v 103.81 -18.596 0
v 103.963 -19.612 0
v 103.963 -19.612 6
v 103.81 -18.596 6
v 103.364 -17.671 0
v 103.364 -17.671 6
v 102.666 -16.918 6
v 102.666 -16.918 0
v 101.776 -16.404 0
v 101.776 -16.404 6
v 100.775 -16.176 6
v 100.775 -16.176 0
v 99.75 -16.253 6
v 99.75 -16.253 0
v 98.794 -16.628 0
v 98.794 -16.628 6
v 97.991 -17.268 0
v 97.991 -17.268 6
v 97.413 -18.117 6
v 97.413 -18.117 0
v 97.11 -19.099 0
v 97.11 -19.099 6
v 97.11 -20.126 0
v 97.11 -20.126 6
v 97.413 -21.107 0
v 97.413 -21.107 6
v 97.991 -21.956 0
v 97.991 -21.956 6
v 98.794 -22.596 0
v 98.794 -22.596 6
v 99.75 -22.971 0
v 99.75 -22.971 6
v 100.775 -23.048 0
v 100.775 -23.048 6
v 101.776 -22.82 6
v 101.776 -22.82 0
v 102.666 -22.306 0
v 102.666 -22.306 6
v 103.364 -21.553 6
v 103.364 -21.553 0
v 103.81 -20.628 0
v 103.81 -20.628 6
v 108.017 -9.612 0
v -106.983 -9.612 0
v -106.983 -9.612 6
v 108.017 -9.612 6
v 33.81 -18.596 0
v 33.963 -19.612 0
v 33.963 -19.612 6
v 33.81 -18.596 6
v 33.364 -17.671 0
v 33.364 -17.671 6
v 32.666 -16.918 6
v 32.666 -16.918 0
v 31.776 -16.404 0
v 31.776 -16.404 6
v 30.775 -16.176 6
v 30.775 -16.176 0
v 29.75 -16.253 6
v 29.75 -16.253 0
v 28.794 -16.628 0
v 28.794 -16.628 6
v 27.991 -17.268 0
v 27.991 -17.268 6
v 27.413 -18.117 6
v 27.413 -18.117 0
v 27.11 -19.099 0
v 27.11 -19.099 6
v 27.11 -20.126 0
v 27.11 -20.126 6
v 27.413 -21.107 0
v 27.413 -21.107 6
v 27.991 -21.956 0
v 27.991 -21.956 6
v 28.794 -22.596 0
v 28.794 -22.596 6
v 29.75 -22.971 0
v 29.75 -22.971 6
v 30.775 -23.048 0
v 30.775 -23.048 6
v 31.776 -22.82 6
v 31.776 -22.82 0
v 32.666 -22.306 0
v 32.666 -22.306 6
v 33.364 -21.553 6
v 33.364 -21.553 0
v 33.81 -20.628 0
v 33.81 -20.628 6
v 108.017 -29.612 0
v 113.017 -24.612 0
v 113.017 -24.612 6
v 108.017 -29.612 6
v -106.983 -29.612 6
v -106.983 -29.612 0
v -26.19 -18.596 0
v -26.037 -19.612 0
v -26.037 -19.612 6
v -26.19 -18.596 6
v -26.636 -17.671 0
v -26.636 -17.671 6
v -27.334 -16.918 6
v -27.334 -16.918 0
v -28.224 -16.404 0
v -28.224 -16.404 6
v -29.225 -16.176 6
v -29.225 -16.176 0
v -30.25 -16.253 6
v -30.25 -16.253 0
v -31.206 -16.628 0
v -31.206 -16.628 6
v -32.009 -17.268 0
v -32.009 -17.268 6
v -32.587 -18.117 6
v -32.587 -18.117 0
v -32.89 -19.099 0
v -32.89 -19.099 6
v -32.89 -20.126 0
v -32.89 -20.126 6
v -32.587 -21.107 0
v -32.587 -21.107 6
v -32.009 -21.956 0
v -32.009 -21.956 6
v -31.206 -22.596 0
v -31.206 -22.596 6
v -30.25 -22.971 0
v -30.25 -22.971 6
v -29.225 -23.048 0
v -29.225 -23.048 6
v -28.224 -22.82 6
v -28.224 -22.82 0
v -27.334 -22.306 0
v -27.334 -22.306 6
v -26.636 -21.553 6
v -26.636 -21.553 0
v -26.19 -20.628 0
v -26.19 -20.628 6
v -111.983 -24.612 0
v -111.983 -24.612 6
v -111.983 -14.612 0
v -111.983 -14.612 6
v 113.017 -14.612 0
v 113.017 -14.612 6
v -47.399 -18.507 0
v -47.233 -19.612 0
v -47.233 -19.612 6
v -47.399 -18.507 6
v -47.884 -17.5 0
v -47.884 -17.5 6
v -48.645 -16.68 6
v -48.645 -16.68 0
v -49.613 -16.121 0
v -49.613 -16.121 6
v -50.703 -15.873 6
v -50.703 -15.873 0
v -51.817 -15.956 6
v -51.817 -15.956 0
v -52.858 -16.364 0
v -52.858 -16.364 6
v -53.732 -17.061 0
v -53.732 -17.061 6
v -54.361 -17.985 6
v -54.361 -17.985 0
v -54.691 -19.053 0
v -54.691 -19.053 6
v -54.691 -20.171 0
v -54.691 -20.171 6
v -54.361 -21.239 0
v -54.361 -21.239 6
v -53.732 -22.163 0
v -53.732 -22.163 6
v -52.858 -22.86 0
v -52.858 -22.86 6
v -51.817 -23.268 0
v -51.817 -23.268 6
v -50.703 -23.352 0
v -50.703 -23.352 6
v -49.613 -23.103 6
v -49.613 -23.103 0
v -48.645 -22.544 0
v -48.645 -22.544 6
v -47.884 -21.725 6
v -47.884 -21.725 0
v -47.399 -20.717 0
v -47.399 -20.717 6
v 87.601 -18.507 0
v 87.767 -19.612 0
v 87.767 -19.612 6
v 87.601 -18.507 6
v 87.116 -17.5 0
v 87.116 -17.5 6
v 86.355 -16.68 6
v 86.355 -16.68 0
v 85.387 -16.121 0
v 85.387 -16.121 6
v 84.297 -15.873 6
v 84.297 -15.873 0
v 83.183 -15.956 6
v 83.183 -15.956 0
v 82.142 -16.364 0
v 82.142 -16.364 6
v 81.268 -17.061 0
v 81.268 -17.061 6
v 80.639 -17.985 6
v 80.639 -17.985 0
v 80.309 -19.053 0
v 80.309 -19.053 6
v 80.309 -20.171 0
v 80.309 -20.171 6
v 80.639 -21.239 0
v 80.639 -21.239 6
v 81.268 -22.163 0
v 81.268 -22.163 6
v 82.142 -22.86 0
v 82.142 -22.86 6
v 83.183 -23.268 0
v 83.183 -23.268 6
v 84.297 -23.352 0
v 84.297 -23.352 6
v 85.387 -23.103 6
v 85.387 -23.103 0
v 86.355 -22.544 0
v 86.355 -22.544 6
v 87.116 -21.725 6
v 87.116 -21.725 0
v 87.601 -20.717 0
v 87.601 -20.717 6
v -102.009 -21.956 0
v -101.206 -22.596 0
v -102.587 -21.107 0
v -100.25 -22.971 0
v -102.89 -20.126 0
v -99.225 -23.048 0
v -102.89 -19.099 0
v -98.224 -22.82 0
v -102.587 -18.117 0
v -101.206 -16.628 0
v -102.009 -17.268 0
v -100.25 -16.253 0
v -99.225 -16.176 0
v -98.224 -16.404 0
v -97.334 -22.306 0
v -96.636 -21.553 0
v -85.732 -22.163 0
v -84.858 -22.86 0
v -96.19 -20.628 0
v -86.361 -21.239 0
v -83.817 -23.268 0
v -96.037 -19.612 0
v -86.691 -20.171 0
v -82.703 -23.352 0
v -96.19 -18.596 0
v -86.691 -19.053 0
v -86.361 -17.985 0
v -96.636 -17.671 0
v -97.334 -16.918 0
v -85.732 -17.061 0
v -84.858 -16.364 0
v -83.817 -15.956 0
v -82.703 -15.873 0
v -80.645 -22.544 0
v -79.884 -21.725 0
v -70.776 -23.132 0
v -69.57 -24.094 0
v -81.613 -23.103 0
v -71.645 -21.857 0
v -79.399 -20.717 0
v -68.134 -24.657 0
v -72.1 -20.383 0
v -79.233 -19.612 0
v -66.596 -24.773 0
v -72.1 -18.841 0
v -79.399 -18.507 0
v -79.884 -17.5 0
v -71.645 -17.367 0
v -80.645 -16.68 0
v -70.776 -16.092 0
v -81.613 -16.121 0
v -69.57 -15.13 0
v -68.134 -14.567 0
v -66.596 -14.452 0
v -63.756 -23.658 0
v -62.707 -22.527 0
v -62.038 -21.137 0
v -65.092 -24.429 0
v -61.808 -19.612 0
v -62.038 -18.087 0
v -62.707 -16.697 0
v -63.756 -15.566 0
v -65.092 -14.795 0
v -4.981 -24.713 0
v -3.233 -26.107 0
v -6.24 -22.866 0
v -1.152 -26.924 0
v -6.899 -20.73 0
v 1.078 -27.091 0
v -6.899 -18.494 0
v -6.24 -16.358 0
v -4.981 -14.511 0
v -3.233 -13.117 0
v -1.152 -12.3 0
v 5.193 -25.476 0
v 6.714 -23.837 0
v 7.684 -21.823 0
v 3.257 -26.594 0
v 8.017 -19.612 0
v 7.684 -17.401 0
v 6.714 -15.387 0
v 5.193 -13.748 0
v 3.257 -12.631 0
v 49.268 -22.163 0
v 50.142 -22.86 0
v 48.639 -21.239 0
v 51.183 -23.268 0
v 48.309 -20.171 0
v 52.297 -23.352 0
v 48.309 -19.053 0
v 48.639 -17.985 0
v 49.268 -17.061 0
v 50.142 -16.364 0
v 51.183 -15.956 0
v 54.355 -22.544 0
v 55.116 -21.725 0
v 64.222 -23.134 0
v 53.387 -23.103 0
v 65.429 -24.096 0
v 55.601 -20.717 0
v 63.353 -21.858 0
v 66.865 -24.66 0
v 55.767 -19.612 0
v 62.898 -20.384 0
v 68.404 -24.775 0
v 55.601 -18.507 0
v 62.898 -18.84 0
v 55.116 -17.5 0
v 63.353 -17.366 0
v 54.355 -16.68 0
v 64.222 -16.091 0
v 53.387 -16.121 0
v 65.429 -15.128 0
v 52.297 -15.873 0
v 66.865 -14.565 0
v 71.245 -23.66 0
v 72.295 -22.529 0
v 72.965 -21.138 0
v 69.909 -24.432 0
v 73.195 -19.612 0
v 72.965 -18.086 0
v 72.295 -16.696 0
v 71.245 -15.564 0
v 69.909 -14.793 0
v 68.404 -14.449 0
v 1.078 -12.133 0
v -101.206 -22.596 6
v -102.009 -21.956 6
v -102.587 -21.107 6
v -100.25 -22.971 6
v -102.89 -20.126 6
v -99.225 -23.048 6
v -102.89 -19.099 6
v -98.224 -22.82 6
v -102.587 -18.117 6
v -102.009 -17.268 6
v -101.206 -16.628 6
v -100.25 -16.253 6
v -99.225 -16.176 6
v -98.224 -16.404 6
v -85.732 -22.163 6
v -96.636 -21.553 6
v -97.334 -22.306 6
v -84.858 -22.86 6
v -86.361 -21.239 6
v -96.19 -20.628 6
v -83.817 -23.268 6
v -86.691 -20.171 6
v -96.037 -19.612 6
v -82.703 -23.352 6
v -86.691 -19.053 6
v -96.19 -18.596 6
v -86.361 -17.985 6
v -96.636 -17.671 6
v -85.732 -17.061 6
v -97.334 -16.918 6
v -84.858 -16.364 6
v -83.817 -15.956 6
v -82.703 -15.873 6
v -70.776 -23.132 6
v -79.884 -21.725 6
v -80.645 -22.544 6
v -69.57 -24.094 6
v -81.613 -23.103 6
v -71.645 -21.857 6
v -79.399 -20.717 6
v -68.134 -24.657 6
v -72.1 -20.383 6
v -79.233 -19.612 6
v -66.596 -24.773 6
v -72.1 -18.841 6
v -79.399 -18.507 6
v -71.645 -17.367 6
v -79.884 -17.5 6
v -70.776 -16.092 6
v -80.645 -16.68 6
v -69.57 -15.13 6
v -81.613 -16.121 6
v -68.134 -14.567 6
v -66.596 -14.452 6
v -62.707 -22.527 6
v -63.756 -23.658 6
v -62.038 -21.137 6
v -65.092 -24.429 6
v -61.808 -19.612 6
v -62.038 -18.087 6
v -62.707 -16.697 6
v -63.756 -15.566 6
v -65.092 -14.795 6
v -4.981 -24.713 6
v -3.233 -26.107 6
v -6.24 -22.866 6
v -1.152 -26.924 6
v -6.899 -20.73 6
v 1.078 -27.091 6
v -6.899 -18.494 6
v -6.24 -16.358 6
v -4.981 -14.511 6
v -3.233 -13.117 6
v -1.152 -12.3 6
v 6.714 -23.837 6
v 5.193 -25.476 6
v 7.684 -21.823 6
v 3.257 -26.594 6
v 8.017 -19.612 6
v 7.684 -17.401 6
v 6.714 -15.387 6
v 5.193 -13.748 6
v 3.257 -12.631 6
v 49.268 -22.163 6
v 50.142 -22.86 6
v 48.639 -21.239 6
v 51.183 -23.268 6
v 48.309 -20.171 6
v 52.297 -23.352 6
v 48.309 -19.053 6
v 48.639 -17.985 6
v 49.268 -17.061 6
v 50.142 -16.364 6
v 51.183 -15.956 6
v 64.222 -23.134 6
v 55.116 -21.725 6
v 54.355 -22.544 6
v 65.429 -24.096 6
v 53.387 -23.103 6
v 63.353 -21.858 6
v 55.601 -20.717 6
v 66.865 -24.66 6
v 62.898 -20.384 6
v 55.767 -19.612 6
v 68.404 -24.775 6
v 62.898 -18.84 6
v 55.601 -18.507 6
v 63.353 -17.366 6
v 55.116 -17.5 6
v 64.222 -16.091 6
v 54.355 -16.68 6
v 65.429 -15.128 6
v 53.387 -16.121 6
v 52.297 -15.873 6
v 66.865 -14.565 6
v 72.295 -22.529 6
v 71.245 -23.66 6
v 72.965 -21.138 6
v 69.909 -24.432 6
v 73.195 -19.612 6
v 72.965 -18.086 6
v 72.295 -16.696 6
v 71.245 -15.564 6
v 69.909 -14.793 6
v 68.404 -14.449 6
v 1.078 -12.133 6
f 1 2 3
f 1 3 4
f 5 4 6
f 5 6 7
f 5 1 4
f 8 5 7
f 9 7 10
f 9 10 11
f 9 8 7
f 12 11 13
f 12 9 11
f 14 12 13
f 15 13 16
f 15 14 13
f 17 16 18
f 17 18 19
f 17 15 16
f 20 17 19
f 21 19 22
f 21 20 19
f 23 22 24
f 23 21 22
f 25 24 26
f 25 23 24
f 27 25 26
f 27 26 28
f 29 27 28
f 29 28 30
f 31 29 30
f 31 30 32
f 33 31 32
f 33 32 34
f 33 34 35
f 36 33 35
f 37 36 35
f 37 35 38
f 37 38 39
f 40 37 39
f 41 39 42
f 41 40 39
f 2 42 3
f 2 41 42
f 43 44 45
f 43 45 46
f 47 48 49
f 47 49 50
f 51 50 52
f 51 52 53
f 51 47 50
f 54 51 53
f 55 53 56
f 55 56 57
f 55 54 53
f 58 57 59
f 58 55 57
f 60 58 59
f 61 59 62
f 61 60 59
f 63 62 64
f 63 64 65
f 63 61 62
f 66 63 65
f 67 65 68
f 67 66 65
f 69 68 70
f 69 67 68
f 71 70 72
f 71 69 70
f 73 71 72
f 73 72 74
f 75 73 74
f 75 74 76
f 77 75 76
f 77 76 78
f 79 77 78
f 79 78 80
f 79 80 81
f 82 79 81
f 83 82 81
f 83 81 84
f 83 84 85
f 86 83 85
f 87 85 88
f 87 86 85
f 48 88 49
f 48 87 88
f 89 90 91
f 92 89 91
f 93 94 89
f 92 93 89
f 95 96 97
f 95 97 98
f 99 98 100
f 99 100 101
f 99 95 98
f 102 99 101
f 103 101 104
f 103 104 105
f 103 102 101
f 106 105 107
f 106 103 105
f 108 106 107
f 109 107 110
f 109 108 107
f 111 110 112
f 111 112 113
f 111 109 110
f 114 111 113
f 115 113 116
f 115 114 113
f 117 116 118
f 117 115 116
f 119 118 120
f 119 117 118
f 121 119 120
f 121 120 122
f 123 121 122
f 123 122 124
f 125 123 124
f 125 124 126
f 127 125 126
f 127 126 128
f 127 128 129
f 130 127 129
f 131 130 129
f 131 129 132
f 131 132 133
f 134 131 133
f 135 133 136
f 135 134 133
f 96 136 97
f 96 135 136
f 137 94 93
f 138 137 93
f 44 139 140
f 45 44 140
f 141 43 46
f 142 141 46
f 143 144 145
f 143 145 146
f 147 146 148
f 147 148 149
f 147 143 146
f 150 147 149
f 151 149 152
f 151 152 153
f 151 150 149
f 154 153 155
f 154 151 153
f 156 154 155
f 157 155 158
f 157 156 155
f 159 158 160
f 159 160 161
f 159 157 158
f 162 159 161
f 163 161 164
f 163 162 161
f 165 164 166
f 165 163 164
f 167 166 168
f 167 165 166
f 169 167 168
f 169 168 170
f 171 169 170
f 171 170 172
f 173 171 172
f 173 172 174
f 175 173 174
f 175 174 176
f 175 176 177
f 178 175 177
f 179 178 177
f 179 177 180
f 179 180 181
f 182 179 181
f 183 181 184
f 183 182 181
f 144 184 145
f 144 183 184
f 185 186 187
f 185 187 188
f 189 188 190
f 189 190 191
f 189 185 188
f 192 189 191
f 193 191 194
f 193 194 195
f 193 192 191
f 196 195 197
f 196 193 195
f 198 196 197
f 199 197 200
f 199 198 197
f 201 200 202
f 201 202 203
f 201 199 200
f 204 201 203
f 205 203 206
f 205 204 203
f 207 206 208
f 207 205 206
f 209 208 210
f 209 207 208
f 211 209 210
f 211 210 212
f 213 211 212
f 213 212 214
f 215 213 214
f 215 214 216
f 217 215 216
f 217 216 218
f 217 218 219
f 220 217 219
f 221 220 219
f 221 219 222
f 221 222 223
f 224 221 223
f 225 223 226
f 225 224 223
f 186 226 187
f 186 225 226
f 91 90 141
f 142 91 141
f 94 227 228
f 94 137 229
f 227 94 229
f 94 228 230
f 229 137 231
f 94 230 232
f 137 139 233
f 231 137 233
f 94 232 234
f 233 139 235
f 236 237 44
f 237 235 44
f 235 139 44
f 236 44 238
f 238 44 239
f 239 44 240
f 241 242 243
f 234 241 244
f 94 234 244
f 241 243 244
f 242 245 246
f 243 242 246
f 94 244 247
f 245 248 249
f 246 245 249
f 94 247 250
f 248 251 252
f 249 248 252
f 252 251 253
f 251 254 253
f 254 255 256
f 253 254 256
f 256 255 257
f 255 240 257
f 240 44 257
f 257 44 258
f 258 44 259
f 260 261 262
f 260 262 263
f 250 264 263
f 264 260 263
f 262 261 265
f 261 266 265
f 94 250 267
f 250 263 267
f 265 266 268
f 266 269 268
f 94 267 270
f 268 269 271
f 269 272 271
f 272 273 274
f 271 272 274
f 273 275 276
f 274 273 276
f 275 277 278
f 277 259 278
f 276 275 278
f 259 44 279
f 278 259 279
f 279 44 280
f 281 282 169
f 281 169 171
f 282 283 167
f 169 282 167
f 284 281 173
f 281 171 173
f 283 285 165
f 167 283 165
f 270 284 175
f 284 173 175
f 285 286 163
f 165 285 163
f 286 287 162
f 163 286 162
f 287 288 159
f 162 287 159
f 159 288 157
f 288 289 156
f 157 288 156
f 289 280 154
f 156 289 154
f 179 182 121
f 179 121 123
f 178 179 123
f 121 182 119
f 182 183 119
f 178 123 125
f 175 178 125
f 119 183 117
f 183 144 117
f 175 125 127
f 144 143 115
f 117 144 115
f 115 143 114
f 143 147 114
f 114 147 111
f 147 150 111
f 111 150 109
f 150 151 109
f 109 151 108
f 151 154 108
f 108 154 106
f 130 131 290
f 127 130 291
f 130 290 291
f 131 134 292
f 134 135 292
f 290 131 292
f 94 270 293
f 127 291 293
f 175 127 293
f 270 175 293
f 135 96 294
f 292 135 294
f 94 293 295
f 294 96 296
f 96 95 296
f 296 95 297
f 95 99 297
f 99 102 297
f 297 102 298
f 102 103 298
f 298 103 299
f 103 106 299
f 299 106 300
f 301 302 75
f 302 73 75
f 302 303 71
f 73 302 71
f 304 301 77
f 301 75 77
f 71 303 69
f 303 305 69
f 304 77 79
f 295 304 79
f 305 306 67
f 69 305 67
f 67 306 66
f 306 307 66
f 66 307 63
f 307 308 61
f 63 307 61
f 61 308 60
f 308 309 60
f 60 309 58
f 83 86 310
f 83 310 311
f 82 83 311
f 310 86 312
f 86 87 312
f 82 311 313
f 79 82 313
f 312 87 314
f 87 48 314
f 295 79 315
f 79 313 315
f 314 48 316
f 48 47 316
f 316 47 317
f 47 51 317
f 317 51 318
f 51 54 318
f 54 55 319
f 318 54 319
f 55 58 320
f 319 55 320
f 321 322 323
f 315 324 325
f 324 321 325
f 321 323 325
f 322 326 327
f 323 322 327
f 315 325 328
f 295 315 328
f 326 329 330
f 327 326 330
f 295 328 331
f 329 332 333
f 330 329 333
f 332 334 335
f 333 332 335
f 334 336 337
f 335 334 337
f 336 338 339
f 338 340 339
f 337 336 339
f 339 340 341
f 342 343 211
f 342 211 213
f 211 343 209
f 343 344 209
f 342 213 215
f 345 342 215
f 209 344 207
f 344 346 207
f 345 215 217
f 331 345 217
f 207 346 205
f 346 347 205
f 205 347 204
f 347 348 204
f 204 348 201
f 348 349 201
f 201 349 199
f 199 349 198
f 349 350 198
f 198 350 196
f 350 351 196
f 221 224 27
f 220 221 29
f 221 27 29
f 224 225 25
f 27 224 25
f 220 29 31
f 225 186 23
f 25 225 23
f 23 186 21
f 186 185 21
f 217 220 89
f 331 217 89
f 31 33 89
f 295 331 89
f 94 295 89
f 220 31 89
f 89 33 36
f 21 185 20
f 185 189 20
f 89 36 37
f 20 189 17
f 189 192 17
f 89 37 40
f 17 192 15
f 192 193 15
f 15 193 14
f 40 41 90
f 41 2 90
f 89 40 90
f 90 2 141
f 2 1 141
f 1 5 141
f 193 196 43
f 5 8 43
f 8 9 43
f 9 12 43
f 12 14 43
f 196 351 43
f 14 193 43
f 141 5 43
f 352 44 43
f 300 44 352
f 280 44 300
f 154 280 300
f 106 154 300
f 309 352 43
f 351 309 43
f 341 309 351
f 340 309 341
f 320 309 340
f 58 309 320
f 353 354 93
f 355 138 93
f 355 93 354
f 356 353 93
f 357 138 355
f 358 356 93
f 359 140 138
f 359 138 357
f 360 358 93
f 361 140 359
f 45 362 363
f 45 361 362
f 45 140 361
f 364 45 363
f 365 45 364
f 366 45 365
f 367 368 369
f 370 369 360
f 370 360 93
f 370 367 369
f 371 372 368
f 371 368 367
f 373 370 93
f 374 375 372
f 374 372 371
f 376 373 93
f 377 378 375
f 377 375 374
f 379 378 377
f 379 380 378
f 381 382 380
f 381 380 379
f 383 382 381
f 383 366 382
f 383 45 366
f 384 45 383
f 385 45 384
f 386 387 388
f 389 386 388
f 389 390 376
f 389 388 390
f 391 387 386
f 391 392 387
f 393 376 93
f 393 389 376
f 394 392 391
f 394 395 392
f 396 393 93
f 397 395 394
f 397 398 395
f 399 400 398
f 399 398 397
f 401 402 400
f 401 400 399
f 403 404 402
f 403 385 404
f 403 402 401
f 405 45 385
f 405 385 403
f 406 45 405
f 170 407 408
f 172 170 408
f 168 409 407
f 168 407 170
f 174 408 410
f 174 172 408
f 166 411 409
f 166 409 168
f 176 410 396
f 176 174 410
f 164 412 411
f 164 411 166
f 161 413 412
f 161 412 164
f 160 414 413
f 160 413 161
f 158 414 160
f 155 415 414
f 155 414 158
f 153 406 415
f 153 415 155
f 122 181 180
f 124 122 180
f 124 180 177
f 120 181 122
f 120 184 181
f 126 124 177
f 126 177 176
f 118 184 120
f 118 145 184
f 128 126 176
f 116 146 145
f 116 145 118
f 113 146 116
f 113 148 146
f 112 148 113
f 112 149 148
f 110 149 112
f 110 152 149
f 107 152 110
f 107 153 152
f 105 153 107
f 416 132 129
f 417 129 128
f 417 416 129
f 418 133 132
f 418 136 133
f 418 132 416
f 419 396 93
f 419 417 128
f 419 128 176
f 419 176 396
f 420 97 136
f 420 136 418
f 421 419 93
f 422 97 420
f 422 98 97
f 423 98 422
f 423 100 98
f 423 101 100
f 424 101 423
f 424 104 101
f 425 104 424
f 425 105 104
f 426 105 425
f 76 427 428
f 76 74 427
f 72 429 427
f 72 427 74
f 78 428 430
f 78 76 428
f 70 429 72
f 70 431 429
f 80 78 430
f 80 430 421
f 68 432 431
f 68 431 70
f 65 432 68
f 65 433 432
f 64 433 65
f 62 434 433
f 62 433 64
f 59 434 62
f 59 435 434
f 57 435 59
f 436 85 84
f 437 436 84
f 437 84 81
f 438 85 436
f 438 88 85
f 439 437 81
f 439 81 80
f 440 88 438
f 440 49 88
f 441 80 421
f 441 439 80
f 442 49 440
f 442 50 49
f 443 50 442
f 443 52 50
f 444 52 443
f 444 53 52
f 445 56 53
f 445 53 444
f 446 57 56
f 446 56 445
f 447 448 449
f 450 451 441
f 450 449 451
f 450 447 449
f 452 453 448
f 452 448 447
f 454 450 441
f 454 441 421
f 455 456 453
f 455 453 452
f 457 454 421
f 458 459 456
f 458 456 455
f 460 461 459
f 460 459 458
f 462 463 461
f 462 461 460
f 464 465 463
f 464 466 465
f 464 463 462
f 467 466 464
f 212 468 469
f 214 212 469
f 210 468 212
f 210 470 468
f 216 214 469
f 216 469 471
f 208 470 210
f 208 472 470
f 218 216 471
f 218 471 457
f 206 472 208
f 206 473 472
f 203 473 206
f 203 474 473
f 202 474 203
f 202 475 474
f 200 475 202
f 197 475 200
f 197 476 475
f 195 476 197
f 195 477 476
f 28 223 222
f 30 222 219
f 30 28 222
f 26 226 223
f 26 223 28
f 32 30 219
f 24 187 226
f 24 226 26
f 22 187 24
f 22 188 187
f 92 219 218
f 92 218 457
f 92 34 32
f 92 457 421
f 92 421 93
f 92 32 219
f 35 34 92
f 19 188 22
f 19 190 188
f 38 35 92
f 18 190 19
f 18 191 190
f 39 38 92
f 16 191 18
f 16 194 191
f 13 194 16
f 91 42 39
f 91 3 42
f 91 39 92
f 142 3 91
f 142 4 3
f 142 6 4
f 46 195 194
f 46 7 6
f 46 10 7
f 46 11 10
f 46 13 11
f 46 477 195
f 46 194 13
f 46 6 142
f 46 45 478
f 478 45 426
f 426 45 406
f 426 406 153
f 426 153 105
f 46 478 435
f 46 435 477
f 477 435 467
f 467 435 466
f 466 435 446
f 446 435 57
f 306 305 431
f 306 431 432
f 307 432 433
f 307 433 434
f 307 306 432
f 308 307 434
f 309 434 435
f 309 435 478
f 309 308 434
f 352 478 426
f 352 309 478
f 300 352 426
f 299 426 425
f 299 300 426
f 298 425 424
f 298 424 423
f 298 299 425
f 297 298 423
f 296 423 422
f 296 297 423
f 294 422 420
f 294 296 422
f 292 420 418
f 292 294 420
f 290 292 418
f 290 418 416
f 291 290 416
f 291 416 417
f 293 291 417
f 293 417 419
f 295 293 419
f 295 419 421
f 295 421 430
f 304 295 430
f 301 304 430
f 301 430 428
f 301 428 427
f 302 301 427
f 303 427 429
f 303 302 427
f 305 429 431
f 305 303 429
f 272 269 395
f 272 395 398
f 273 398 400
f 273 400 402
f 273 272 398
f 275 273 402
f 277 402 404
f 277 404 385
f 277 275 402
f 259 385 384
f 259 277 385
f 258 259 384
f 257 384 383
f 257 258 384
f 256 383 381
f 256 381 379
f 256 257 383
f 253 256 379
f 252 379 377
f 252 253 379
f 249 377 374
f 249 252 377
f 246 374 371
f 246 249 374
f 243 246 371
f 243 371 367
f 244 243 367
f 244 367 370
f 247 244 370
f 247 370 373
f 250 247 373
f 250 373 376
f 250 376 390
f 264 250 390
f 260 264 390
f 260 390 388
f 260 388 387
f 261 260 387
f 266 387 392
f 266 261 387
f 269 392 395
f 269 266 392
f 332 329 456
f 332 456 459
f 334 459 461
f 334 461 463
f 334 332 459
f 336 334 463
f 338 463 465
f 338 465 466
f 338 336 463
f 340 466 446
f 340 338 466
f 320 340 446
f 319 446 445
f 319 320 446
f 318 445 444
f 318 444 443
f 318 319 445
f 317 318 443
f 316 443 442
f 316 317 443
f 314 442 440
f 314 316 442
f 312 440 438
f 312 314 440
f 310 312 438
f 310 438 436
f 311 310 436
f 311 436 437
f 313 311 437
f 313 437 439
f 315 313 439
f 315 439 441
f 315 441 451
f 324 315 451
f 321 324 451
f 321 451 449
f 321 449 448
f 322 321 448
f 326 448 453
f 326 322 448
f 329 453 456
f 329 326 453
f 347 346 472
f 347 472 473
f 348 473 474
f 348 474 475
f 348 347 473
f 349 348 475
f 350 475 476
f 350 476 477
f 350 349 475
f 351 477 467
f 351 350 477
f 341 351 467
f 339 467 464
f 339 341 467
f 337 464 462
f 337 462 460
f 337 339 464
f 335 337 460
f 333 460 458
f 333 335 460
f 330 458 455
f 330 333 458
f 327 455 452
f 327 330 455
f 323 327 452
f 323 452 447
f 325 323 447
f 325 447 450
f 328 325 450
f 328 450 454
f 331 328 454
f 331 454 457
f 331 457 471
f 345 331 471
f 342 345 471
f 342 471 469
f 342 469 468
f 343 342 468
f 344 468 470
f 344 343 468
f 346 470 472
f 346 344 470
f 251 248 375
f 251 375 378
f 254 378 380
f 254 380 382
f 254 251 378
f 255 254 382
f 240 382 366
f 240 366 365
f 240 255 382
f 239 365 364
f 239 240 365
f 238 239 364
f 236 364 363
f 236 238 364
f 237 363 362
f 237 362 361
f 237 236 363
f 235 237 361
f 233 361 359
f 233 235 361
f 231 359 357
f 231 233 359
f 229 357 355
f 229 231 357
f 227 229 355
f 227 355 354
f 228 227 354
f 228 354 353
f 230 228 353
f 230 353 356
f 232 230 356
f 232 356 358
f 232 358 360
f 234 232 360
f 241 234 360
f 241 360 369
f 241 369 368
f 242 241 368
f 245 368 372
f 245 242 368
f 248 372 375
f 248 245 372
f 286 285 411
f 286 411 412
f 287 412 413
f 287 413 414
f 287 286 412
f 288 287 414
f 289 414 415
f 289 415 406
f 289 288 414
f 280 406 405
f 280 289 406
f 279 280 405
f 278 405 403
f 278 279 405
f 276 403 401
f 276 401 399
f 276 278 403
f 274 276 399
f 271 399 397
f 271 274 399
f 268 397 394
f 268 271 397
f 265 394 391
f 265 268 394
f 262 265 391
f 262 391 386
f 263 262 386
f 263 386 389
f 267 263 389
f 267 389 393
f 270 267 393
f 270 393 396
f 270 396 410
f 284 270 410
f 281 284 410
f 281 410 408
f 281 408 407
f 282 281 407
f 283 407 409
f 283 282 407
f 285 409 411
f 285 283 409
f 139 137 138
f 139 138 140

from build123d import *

# Parameters (mm, degrees)
SKETCH1_W           = 225
SKETCH1_H           = 20
SKETCH1_R           = 3.75
SKETCH1_R_2         = 5.177315147
SKETCH1_R_3         = 5.175
SKETCH1_R_4         = 3.445800431
SKETCH1_R_5         = 7.5
BOSS_EXTRUDE1_DEPTH = 6
CHAMFER1_SIZE       = 5


with BuildPart() as part:
    # Sketch1 → Boss-Extrude1 (new body)
    with BuildSketch(Plane.XY):
        with Locations((0.517233183, -19.612075113)):
            Rectangle(SKETCH1_W, SKETCH1_H)
        with Locations((84.017233183, -19.612075113)):
            Circle(SKETCH1_R, mode=Mode.SUBTRACT)
        with Locations((52.017233183, -19.612075113)):
            Circle(SKETCH1_R, mode=Mode.SUBTRACT)
        with Locations((68.017233183, -19.612075113)):
            Circle(SKETCH1_R_2, mode=Mode.SUBTRACT)
        with Locations((-50.982766817, -19.612075113)):
            Circle(SKETCH1_R, mode=Mode.SUBTRACT)
        with Locations((-82.982766817, -19.612075113)):
            Circle(SKETCH1_R, mode=Mode.SUBTRACT)
        with Locations((-66.982766817, -19.612075113)):
            Circle(SKETCH1_R_3, mode=Mode.SUBTRACT)
        with Locations((30.517233183, -19.612075113)):
            Circle(SKETCH1_R_4, mode=Mode.SUBTRACT)
        with Locations((-29.482766817, -19.612075113)):
            Circle(SKETCH1_R_4, mode=Mode.SUBTRACT)
        with Locations((100.517233183, -19.612075113)):
            Circle(SKETCH1_R_4, mode=Mode.SUBTRACT)
        with Locations((-99.482766817, -19.612075113)):
            Circle(SKETCH1_R_4, mode=Mode.SUBTRACT)
        with Locations((0.517233183, -19.612075113)):
            Circle(SKETCH1_R_5, mode=Mode.SUBTRACT)
    extrude(amount=BOSS_EXTRUDE1_DEPTH)

    # Chamfer1
    chamfer1_edges = [part.edges().sort_by_distance(p)[0] for p in [
        (-111.982766817, -9.612075113, 3),
        (113.017233183, -9.612075113, 3),
        (113.017233183, -29.612075113, 3),
        (-111.982766817, -29.612075113, 3),
    ]]
    chamfer(chamfer1_edges, length=CHAMFER1_SIZE)


solid = part.part
